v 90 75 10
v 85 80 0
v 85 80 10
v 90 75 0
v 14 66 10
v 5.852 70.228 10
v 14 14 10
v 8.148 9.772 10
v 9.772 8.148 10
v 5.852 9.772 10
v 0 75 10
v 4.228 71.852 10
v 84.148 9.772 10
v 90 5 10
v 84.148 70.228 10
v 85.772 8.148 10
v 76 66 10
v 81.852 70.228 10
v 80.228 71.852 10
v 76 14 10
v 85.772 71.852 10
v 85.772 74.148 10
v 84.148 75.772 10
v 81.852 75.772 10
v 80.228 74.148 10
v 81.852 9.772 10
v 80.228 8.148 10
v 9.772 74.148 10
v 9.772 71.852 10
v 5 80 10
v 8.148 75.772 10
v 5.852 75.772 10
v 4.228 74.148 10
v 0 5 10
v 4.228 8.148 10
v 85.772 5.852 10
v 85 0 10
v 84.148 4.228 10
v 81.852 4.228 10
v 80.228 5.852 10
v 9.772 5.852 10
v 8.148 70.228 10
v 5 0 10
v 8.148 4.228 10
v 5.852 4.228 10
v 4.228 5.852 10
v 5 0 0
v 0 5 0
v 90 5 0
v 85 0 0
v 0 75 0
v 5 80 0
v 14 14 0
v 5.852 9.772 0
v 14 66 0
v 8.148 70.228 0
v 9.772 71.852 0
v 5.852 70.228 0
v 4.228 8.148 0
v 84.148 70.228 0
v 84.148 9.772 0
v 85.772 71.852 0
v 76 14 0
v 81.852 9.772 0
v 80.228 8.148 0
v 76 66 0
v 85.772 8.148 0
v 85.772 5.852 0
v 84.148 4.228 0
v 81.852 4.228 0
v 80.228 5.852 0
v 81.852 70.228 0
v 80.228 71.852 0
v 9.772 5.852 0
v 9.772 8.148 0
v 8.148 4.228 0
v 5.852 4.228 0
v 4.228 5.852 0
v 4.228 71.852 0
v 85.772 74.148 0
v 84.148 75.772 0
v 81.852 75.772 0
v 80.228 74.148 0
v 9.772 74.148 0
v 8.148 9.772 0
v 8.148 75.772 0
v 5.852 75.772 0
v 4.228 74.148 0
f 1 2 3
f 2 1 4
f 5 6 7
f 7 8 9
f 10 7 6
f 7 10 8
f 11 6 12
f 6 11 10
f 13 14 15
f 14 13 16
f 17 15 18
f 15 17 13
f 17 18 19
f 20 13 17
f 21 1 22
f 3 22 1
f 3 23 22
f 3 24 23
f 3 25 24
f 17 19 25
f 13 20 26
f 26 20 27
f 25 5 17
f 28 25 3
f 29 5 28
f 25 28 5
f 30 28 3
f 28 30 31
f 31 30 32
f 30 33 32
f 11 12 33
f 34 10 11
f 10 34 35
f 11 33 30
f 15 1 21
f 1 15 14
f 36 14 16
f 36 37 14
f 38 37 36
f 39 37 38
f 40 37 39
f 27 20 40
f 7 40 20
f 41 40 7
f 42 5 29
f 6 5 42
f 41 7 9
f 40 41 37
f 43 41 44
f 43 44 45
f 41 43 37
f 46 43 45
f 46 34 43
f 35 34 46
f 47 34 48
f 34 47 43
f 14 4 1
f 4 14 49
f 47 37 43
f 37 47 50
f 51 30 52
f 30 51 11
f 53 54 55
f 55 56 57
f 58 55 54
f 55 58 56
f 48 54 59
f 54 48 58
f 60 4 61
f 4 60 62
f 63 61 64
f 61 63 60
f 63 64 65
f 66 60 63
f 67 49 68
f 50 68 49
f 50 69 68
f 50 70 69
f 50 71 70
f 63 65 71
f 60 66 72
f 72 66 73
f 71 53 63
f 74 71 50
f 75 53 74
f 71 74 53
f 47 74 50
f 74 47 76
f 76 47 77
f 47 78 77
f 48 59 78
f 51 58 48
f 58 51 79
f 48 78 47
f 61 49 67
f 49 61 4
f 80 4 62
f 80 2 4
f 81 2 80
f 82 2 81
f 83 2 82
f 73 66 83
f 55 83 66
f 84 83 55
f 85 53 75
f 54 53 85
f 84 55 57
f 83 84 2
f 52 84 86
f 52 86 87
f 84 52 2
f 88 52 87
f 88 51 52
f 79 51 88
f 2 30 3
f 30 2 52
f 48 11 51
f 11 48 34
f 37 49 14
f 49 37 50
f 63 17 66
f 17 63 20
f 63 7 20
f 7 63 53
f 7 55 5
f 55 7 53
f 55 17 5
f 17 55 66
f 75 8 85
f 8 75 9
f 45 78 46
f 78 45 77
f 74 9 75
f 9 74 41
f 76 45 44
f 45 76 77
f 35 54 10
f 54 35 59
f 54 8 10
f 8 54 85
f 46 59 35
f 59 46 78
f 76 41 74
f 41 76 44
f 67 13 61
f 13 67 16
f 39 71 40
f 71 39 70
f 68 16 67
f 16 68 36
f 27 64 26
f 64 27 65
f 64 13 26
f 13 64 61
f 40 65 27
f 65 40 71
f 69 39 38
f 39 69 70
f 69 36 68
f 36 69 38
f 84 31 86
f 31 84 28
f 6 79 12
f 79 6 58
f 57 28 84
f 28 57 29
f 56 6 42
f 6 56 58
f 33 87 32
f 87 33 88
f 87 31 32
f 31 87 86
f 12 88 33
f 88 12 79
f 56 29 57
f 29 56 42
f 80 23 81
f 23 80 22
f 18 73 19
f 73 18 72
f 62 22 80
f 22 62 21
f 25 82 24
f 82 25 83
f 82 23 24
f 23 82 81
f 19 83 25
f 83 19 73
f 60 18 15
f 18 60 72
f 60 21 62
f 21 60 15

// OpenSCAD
$fn = 32;

// ----------------------------------------------------------------------
// Frame plate: 90 x 80 frame, 14 mm rails
// ----------------------------------------------------------------------

// --- parameters (mm) ---
plate_l = 90;             // plate length, X
plate_w = 80;             // plate width, Y
plate_t = 10;             // plate thickness, Z (extrusion height)
corner_c = 5;             // corner chamfer
frame_bar = 14;           // frame rail width
bolt_r = 3;               // corner bolt window radius
bolt_inset = 7;           // bolt centre inset from the edges
fit_tol = 0.05;           // declared fit tolerance (prompt contract)
free_tol = 0.2;           // declared free tolerance (prompt contract)

win_l = plate_l - 2 * frame_bar;  // window length
win_w = plate_w - 2 * frame_bar;  // window width
bolt_d = 2 * bolt_r;  // corner hole diameter

profile = [[5, 0], [85, 0], [90, 5], [90, 75], [85, 80], [5, 80], [0, 75], [0, 5]];  // primary outline, 8 points, counter clockwise
void_1 = [[14, 14], [76, 14], [76, 66], [14, 66]];  // the window, 4 points
void_2 = [[9.772, 8.148], [8.148, 9.772], [5.852, 9.772], [4.228, 8.148], [4.228, 5.852], [5.852, 4.228], [8.148, 4.228], [9.772, 5.852]];  // corner bolt window, 8 points
void_3 = [[85.772, 8.148], [84.148, 9.772], [81.852, 9.772], [80.228, 8.148], [80.228, 5.852], [81.852, 4.228], [84.148, 4.228], [85.772, 5.852]];  // corner bolt window, 8 points
void_4 = [[9.772, 74.148], [8.148, 75.772], [5.852, 75.772], [4.228, 74.148], [4.228, 71.852], [5.852, 70.228], [8.148, 70.228], [9.772, 71.852]];  // corner bolt window, 8 points
void_5 = [[85.772, 74.148], [84.148, 75.772], [81.852, 75.772], [80.228, 74.148], [80.228, 71.852], [81.852, 70.228], [84.148, 70.228], [85.772, 71.852]];  // corner bolt window, 8 points

// --- the one profile operation ---
difference() {
  linear_extrude(height = plate_t) polygon(points = profile);
  translate([0, 0, -1])
    linear_extrude(height = plate_t + 2) polygon(points = void_1);
  translate([0, 0, -1])
    linear_extrude(height = plate_t + 2) polygon(points = void_2);
  translate([0, 0, -1])
    linear_extrude(height = plate_t + 2) polygon(points = void_3);
  translate([0, 0, -1])
    linear_extrude(height = plate_t + 2) polygon(points = void_4);
  translate([0, 0, -1])
    linear_extrude(height = plate_t + 2) polygon(points = void_5);
}
